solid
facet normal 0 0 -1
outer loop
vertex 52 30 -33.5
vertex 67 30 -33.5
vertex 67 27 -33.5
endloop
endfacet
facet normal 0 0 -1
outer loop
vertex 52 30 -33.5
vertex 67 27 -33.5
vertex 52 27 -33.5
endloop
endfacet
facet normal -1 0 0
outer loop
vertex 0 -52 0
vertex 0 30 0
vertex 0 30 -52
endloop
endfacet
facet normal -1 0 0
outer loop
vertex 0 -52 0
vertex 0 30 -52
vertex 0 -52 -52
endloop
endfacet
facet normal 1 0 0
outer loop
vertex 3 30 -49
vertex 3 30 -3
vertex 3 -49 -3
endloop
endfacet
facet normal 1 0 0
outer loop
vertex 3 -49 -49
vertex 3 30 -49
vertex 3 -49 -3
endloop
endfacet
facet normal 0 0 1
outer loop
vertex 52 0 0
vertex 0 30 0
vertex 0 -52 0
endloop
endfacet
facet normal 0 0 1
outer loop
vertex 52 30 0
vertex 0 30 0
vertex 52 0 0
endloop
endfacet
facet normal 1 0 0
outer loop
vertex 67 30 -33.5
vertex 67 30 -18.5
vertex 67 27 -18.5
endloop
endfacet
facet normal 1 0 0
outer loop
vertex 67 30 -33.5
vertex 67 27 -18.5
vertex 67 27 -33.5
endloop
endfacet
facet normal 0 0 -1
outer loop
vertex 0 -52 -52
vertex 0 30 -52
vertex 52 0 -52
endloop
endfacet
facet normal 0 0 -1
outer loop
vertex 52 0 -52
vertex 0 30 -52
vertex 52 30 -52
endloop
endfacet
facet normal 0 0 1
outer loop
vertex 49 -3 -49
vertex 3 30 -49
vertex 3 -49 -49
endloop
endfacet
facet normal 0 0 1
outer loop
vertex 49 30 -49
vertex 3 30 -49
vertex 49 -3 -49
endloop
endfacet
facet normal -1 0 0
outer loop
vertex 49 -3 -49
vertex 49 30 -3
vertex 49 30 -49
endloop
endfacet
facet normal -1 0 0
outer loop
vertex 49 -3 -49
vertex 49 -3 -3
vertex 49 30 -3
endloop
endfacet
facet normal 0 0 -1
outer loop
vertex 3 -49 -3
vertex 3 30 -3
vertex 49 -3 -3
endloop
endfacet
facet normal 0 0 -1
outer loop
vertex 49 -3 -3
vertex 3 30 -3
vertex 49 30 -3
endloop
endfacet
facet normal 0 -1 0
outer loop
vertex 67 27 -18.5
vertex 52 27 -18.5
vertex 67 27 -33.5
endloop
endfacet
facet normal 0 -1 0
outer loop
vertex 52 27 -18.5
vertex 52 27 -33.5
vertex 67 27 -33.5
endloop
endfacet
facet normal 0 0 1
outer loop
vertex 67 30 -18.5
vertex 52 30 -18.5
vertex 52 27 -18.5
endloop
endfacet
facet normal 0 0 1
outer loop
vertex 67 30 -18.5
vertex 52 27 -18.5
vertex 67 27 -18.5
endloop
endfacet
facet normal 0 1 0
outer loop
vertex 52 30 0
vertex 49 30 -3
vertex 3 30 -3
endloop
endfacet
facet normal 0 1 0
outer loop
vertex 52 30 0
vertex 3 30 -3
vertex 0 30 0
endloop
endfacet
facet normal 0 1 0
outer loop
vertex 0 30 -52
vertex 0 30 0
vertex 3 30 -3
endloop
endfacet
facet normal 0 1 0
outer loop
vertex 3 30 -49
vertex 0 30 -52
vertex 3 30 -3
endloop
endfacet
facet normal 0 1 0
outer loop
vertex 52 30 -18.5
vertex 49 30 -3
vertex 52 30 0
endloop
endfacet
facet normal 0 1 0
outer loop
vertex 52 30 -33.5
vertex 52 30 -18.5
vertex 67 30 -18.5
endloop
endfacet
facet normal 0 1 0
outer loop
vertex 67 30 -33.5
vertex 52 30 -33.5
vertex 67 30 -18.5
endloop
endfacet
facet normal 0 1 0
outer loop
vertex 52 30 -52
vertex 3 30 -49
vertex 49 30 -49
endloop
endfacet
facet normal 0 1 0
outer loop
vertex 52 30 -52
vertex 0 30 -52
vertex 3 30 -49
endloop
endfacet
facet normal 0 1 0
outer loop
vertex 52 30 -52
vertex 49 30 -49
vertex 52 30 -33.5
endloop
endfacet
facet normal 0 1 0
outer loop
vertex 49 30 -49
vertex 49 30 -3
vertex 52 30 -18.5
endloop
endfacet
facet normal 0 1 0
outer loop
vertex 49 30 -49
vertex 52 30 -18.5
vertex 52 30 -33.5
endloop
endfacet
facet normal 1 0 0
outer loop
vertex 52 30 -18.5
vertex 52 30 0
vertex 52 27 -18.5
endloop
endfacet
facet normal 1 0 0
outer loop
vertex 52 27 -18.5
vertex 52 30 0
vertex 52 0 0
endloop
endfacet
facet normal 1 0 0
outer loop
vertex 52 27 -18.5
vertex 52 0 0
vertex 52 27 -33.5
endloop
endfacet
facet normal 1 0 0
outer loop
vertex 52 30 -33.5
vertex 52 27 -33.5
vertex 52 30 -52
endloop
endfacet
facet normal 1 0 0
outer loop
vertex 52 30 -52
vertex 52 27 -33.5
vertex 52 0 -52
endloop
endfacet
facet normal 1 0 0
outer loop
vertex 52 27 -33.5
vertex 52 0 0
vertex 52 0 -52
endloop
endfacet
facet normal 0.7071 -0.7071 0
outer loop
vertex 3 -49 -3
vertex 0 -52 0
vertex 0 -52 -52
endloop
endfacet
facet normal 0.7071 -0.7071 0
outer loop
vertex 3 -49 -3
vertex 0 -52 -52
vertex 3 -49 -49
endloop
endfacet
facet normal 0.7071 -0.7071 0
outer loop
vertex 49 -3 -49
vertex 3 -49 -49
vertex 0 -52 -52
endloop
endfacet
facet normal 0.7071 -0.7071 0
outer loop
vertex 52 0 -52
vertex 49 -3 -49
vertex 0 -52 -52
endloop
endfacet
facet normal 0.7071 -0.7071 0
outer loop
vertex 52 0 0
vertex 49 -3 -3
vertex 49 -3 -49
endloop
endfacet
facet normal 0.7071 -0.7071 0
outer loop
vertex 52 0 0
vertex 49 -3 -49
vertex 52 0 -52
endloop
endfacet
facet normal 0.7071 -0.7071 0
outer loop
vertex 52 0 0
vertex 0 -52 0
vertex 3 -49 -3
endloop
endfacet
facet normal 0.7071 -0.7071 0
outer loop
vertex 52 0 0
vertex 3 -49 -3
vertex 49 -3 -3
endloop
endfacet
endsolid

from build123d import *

# Parameters (mm, degrees)
CROQUIS1_W              = 52
CROQUIS1_H              = 52
SALIENTE_EXTRUIR1_DEPTH = 30
SALIENTE_EXTRUIR2_DEPTH = 52
VACIADO4_T              = -3
SALIENTE_EXTRUIR3_DEPTH = 3


with BuildPart() as part:
    # Croquis1 → Saliente-Extruir1 (new body)
    with BuildSketch(Plane(origin=(0, 0, 0), x_dir=(1, 0, 0), z_dir=(0, 1, 0))):
        with Locations((26, 26)):
            Rectangle(CROQUIS1_W, CROQUIS1_H)
    extrude(amount=SALIENTE_EXTRUIR1_DEPTH)

    # Croquis2 → Saliente-Extruir2 (add)
    with BuildSketch(Plane.XY):
        Polygon((0, 0), (0, -52), (52, 0), align=None)
    extrude(amount=-SALIENTE_EXTRUIR2_DEPTH)

    # Vaciado4
    vaciado4_openings = [part.faces().sort_by_distance(p)[0] for p in [
        (26, 30, -26),
        (26, -26, -26),
    ]]
    offset(amount=VACIADO4_T, openings=vaciado4_openings, kind=Kind.INTERSECTION)

    # Croquis3 → Saliente-Extruir3 (add)
    with BuildSketch(Plane(origin=(0, 30, 0), x_dir=(1, 0, 0), z_dir=(0, 1, 0))):
        Polygon((52, 18.5), (67, 18.5), (67, 26), (67, 33.5), (52, 33.5), align=None)
    extrude(amount=-SALIENTE_EXTRUIR3_DEPTH)


solid = part.part
